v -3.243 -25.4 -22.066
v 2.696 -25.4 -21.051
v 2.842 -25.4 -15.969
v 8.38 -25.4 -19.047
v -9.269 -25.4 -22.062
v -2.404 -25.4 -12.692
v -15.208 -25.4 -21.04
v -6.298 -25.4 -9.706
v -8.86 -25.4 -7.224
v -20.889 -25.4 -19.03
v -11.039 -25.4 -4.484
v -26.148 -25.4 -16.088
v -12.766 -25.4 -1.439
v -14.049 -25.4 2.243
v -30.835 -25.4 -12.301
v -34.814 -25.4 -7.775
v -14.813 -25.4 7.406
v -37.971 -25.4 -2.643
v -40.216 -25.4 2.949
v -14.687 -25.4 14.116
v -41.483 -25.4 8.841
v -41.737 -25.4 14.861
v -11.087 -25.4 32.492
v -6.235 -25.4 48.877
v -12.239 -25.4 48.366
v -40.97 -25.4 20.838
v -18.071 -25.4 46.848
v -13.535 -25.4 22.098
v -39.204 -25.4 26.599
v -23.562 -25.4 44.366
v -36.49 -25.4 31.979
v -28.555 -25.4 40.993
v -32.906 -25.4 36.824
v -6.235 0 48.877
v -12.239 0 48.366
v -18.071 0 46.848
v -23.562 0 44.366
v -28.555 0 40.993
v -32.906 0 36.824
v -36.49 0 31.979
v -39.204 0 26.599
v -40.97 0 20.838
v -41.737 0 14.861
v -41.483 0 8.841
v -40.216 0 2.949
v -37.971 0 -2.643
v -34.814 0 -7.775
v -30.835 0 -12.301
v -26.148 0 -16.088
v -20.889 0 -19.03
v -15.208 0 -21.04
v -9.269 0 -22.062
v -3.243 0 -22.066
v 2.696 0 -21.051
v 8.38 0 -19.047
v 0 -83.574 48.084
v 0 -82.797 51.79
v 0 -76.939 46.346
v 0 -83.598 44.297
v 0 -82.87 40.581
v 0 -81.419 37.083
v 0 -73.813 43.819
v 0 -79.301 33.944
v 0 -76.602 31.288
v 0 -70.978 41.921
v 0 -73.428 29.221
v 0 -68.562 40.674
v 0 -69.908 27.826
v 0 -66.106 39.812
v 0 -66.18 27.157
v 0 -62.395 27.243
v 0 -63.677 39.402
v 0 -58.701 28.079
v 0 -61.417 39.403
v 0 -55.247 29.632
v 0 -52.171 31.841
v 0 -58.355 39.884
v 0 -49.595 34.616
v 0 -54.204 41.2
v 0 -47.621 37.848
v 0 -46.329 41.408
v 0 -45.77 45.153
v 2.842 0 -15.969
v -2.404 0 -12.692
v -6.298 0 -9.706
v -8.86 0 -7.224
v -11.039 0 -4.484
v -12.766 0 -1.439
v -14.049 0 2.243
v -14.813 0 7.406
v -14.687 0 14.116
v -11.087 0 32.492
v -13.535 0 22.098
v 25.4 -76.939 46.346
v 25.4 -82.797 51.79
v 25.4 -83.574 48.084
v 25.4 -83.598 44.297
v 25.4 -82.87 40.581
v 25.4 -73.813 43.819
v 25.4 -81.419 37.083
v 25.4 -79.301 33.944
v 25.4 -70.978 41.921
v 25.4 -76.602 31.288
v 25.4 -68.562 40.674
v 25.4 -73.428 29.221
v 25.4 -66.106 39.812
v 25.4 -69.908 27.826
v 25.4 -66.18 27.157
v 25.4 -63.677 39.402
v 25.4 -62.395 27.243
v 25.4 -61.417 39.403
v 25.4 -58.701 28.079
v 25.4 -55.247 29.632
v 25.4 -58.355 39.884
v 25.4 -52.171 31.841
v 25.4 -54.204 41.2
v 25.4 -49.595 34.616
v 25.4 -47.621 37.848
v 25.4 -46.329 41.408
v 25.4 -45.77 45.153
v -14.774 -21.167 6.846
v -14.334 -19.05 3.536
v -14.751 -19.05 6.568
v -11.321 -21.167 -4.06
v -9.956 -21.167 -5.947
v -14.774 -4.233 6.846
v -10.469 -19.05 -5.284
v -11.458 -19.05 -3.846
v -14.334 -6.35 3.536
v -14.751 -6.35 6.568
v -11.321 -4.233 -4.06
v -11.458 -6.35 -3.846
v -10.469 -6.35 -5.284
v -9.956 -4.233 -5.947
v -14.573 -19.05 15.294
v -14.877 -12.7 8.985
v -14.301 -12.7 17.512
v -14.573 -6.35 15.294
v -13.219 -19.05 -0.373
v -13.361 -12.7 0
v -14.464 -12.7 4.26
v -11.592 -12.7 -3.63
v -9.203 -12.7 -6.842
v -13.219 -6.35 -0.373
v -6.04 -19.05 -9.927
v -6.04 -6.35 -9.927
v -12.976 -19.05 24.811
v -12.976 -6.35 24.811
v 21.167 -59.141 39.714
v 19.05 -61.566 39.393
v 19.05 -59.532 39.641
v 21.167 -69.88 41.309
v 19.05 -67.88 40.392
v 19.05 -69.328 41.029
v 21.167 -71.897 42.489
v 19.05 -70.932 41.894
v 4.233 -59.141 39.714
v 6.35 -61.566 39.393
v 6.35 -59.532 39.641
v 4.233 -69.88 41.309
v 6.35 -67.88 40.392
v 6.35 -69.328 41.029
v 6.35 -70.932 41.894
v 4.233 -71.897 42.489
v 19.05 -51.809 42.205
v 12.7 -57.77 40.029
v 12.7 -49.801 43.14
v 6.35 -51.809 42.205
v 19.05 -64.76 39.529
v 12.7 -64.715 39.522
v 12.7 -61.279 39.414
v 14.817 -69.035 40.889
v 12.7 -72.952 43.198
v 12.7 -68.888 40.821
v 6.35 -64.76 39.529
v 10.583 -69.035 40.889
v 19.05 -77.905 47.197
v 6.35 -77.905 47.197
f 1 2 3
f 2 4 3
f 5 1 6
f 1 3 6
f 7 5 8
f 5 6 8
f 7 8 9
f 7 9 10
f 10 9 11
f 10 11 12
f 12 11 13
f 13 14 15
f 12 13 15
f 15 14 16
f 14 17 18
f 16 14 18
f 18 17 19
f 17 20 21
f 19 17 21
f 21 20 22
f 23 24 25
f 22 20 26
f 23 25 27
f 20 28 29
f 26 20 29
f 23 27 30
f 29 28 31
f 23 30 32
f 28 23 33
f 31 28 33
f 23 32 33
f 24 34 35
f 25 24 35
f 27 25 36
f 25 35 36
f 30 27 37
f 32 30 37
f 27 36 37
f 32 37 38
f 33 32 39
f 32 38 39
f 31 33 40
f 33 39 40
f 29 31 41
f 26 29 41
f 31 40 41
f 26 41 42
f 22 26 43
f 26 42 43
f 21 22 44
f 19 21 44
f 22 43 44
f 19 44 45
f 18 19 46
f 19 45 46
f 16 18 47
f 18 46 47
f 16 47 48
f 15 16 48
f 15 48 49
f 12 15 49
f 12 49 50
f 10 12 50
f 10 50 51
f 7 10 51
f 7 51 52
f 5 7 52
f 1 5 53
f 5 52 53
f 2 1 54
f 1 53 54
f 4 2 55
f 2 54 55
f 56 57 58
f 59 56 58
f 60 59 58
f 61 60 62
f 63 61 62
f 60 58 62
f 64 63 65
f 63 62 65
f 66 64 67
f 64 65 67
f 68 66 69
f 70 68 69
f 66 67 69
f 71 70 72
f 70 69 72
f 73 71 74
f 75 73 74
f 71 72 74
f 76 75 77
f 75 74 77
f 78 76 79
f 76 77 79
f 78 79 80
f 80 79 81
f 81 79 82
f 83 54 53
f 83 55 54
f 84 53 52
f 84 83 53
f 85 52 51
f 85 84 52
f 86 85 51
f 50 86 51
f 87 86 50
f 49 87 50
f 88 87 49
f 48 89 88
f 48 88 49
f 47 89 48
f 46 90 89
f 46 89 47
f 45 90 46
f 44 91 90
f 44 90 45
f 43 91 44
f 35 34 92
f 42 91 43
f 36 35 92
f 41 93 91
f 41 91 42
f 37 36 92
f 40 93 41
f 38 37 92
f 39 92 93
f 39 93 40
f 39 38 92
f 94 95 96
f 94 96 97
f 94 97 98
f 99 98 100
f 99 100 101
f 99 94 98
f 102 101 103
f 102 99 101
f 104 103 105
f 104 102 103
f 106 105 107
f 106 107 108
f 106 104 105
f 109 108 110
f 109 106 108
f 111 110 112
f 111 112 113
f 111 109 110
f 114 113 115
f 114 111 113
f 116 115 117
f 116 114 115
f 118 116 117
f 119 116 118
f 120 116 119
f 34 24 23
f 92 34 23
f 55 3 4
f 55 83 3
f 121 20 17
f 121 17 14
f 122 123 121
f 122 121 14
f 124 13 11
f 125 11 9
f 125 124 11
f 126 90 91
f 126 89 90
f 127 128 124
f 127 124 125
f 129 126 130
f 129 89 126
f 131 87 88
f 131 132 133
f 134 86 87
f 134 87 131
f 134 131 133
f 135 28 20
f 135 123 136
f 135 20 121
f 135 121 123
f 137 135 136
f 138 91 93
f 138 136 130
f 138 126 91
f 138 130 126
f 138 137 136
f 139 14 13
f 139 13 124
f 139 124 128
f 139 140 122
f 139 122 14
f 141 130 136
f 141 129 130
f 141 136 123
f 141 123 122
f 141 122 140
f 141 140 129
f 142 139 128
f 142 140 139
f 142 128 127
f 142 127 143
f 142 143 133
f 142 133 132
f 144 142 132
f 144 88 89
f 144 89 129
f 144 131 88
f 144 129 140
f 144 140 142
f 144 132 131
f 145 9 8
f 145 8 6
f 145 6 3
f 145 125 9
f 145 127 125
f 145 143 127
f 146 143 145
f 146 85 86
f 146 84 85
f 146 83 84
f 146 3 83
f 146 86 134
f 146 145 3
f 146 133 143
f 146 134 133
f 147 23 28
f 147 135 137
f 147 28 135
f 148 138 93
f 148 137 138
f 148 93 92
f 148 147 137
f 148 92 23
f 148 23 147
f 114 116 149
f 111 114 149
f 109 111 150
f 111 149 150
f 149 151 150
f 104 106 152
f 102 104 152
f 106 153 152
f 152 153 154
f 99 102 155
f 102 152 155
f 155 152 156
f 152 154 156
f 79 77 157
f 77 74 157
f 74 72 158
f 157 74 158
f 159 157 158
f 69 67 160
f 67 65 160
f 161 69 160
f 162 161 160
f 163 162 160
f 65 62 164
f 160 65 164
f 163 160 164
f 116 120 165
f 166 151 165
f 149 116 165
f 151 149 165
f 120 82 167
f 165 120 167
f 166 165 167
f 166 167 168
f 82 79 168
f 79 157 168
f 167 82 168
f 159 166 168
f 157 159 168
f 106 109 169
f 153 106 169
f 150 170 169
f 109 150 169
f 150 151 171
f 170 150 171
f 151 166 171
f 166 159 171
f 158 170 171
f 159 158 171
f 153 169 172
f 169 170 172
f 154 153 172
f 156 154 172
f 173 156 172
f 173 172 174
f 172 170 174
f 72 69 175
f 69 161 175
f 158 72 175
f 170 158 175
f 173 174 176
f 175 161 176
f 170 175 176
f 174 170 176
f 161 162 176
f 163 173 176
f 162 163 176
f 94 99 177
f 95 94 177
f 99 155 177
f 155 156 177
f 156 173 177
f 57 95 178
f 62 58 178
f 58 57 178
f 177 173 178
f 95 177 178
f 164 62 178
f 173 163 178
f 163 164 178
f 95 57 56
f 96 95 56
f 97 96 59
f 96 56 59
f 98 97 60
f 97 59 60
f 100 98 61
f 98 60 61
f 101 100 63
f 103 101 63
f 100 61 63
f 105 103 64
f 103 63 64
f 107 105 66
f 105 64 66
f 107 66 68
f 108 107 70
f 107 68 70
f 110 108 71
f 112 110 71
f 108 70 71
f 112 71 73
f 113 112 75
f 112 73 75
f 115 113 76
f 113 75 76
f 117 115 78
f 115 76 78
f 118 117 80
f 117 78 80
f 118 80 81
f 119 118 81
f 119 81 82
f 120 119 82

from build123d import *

# Parameters (mm, degrees)
F1_DEPTH = 25.4
F3_DEPTH = 25.4


with BuildPart() as f1:
    # F0 (on Front) → F1 (new body)
    with BuildSketch(Plane.XZ):
        with BuildLine():
            add(Edge.make_bspline(
                [(-6.2351627275, 48.8771246855), (-11.9666806332, 30.3211312778), (-22.0851096166, -2.428572316), (-0.8297734406, -14.0277358442), (8.3795179402, -19.0474061524)],
                knots=[0, 0, 0, 0, 0.5665817644, 1, 1, 1, 1], degree=3))
            ThreePointArc((-6.2351627275, 48.8771246855), (-40.9746603512, 5.8680377095), (8.3795179402, -19.0474061524))
        make_face()
    extrude(amount=F1_DEPTH)


with BuildPart() as f3:
    # F2 (on Right) → F3 (new body)
    with BuildSketch(Plane.YZ):
        with BuildLine():
            add(Edge.make_bspline(
                [(-45.7698516548, 45.1533645391), (-52.2267127965, 41.8707972103), (-65.4729200372, 35.1366323949), (-76.9265695807, 46.1470873614), (-82.797139883, 51.7904981971)],
                knots=[0, 0, 0, 0, 0.4874498054, 1, 1, 1, 1], degree=3))
            ThreePointArc((-82.797139883, 51.7904981971), (-68.0609500562, 27.3982426536), (-45.7698516548, 45.1533645391))
        make_face()
    extrude(amount=F3_DEPTH)


solid = Compound([f1.part, f3.part])
